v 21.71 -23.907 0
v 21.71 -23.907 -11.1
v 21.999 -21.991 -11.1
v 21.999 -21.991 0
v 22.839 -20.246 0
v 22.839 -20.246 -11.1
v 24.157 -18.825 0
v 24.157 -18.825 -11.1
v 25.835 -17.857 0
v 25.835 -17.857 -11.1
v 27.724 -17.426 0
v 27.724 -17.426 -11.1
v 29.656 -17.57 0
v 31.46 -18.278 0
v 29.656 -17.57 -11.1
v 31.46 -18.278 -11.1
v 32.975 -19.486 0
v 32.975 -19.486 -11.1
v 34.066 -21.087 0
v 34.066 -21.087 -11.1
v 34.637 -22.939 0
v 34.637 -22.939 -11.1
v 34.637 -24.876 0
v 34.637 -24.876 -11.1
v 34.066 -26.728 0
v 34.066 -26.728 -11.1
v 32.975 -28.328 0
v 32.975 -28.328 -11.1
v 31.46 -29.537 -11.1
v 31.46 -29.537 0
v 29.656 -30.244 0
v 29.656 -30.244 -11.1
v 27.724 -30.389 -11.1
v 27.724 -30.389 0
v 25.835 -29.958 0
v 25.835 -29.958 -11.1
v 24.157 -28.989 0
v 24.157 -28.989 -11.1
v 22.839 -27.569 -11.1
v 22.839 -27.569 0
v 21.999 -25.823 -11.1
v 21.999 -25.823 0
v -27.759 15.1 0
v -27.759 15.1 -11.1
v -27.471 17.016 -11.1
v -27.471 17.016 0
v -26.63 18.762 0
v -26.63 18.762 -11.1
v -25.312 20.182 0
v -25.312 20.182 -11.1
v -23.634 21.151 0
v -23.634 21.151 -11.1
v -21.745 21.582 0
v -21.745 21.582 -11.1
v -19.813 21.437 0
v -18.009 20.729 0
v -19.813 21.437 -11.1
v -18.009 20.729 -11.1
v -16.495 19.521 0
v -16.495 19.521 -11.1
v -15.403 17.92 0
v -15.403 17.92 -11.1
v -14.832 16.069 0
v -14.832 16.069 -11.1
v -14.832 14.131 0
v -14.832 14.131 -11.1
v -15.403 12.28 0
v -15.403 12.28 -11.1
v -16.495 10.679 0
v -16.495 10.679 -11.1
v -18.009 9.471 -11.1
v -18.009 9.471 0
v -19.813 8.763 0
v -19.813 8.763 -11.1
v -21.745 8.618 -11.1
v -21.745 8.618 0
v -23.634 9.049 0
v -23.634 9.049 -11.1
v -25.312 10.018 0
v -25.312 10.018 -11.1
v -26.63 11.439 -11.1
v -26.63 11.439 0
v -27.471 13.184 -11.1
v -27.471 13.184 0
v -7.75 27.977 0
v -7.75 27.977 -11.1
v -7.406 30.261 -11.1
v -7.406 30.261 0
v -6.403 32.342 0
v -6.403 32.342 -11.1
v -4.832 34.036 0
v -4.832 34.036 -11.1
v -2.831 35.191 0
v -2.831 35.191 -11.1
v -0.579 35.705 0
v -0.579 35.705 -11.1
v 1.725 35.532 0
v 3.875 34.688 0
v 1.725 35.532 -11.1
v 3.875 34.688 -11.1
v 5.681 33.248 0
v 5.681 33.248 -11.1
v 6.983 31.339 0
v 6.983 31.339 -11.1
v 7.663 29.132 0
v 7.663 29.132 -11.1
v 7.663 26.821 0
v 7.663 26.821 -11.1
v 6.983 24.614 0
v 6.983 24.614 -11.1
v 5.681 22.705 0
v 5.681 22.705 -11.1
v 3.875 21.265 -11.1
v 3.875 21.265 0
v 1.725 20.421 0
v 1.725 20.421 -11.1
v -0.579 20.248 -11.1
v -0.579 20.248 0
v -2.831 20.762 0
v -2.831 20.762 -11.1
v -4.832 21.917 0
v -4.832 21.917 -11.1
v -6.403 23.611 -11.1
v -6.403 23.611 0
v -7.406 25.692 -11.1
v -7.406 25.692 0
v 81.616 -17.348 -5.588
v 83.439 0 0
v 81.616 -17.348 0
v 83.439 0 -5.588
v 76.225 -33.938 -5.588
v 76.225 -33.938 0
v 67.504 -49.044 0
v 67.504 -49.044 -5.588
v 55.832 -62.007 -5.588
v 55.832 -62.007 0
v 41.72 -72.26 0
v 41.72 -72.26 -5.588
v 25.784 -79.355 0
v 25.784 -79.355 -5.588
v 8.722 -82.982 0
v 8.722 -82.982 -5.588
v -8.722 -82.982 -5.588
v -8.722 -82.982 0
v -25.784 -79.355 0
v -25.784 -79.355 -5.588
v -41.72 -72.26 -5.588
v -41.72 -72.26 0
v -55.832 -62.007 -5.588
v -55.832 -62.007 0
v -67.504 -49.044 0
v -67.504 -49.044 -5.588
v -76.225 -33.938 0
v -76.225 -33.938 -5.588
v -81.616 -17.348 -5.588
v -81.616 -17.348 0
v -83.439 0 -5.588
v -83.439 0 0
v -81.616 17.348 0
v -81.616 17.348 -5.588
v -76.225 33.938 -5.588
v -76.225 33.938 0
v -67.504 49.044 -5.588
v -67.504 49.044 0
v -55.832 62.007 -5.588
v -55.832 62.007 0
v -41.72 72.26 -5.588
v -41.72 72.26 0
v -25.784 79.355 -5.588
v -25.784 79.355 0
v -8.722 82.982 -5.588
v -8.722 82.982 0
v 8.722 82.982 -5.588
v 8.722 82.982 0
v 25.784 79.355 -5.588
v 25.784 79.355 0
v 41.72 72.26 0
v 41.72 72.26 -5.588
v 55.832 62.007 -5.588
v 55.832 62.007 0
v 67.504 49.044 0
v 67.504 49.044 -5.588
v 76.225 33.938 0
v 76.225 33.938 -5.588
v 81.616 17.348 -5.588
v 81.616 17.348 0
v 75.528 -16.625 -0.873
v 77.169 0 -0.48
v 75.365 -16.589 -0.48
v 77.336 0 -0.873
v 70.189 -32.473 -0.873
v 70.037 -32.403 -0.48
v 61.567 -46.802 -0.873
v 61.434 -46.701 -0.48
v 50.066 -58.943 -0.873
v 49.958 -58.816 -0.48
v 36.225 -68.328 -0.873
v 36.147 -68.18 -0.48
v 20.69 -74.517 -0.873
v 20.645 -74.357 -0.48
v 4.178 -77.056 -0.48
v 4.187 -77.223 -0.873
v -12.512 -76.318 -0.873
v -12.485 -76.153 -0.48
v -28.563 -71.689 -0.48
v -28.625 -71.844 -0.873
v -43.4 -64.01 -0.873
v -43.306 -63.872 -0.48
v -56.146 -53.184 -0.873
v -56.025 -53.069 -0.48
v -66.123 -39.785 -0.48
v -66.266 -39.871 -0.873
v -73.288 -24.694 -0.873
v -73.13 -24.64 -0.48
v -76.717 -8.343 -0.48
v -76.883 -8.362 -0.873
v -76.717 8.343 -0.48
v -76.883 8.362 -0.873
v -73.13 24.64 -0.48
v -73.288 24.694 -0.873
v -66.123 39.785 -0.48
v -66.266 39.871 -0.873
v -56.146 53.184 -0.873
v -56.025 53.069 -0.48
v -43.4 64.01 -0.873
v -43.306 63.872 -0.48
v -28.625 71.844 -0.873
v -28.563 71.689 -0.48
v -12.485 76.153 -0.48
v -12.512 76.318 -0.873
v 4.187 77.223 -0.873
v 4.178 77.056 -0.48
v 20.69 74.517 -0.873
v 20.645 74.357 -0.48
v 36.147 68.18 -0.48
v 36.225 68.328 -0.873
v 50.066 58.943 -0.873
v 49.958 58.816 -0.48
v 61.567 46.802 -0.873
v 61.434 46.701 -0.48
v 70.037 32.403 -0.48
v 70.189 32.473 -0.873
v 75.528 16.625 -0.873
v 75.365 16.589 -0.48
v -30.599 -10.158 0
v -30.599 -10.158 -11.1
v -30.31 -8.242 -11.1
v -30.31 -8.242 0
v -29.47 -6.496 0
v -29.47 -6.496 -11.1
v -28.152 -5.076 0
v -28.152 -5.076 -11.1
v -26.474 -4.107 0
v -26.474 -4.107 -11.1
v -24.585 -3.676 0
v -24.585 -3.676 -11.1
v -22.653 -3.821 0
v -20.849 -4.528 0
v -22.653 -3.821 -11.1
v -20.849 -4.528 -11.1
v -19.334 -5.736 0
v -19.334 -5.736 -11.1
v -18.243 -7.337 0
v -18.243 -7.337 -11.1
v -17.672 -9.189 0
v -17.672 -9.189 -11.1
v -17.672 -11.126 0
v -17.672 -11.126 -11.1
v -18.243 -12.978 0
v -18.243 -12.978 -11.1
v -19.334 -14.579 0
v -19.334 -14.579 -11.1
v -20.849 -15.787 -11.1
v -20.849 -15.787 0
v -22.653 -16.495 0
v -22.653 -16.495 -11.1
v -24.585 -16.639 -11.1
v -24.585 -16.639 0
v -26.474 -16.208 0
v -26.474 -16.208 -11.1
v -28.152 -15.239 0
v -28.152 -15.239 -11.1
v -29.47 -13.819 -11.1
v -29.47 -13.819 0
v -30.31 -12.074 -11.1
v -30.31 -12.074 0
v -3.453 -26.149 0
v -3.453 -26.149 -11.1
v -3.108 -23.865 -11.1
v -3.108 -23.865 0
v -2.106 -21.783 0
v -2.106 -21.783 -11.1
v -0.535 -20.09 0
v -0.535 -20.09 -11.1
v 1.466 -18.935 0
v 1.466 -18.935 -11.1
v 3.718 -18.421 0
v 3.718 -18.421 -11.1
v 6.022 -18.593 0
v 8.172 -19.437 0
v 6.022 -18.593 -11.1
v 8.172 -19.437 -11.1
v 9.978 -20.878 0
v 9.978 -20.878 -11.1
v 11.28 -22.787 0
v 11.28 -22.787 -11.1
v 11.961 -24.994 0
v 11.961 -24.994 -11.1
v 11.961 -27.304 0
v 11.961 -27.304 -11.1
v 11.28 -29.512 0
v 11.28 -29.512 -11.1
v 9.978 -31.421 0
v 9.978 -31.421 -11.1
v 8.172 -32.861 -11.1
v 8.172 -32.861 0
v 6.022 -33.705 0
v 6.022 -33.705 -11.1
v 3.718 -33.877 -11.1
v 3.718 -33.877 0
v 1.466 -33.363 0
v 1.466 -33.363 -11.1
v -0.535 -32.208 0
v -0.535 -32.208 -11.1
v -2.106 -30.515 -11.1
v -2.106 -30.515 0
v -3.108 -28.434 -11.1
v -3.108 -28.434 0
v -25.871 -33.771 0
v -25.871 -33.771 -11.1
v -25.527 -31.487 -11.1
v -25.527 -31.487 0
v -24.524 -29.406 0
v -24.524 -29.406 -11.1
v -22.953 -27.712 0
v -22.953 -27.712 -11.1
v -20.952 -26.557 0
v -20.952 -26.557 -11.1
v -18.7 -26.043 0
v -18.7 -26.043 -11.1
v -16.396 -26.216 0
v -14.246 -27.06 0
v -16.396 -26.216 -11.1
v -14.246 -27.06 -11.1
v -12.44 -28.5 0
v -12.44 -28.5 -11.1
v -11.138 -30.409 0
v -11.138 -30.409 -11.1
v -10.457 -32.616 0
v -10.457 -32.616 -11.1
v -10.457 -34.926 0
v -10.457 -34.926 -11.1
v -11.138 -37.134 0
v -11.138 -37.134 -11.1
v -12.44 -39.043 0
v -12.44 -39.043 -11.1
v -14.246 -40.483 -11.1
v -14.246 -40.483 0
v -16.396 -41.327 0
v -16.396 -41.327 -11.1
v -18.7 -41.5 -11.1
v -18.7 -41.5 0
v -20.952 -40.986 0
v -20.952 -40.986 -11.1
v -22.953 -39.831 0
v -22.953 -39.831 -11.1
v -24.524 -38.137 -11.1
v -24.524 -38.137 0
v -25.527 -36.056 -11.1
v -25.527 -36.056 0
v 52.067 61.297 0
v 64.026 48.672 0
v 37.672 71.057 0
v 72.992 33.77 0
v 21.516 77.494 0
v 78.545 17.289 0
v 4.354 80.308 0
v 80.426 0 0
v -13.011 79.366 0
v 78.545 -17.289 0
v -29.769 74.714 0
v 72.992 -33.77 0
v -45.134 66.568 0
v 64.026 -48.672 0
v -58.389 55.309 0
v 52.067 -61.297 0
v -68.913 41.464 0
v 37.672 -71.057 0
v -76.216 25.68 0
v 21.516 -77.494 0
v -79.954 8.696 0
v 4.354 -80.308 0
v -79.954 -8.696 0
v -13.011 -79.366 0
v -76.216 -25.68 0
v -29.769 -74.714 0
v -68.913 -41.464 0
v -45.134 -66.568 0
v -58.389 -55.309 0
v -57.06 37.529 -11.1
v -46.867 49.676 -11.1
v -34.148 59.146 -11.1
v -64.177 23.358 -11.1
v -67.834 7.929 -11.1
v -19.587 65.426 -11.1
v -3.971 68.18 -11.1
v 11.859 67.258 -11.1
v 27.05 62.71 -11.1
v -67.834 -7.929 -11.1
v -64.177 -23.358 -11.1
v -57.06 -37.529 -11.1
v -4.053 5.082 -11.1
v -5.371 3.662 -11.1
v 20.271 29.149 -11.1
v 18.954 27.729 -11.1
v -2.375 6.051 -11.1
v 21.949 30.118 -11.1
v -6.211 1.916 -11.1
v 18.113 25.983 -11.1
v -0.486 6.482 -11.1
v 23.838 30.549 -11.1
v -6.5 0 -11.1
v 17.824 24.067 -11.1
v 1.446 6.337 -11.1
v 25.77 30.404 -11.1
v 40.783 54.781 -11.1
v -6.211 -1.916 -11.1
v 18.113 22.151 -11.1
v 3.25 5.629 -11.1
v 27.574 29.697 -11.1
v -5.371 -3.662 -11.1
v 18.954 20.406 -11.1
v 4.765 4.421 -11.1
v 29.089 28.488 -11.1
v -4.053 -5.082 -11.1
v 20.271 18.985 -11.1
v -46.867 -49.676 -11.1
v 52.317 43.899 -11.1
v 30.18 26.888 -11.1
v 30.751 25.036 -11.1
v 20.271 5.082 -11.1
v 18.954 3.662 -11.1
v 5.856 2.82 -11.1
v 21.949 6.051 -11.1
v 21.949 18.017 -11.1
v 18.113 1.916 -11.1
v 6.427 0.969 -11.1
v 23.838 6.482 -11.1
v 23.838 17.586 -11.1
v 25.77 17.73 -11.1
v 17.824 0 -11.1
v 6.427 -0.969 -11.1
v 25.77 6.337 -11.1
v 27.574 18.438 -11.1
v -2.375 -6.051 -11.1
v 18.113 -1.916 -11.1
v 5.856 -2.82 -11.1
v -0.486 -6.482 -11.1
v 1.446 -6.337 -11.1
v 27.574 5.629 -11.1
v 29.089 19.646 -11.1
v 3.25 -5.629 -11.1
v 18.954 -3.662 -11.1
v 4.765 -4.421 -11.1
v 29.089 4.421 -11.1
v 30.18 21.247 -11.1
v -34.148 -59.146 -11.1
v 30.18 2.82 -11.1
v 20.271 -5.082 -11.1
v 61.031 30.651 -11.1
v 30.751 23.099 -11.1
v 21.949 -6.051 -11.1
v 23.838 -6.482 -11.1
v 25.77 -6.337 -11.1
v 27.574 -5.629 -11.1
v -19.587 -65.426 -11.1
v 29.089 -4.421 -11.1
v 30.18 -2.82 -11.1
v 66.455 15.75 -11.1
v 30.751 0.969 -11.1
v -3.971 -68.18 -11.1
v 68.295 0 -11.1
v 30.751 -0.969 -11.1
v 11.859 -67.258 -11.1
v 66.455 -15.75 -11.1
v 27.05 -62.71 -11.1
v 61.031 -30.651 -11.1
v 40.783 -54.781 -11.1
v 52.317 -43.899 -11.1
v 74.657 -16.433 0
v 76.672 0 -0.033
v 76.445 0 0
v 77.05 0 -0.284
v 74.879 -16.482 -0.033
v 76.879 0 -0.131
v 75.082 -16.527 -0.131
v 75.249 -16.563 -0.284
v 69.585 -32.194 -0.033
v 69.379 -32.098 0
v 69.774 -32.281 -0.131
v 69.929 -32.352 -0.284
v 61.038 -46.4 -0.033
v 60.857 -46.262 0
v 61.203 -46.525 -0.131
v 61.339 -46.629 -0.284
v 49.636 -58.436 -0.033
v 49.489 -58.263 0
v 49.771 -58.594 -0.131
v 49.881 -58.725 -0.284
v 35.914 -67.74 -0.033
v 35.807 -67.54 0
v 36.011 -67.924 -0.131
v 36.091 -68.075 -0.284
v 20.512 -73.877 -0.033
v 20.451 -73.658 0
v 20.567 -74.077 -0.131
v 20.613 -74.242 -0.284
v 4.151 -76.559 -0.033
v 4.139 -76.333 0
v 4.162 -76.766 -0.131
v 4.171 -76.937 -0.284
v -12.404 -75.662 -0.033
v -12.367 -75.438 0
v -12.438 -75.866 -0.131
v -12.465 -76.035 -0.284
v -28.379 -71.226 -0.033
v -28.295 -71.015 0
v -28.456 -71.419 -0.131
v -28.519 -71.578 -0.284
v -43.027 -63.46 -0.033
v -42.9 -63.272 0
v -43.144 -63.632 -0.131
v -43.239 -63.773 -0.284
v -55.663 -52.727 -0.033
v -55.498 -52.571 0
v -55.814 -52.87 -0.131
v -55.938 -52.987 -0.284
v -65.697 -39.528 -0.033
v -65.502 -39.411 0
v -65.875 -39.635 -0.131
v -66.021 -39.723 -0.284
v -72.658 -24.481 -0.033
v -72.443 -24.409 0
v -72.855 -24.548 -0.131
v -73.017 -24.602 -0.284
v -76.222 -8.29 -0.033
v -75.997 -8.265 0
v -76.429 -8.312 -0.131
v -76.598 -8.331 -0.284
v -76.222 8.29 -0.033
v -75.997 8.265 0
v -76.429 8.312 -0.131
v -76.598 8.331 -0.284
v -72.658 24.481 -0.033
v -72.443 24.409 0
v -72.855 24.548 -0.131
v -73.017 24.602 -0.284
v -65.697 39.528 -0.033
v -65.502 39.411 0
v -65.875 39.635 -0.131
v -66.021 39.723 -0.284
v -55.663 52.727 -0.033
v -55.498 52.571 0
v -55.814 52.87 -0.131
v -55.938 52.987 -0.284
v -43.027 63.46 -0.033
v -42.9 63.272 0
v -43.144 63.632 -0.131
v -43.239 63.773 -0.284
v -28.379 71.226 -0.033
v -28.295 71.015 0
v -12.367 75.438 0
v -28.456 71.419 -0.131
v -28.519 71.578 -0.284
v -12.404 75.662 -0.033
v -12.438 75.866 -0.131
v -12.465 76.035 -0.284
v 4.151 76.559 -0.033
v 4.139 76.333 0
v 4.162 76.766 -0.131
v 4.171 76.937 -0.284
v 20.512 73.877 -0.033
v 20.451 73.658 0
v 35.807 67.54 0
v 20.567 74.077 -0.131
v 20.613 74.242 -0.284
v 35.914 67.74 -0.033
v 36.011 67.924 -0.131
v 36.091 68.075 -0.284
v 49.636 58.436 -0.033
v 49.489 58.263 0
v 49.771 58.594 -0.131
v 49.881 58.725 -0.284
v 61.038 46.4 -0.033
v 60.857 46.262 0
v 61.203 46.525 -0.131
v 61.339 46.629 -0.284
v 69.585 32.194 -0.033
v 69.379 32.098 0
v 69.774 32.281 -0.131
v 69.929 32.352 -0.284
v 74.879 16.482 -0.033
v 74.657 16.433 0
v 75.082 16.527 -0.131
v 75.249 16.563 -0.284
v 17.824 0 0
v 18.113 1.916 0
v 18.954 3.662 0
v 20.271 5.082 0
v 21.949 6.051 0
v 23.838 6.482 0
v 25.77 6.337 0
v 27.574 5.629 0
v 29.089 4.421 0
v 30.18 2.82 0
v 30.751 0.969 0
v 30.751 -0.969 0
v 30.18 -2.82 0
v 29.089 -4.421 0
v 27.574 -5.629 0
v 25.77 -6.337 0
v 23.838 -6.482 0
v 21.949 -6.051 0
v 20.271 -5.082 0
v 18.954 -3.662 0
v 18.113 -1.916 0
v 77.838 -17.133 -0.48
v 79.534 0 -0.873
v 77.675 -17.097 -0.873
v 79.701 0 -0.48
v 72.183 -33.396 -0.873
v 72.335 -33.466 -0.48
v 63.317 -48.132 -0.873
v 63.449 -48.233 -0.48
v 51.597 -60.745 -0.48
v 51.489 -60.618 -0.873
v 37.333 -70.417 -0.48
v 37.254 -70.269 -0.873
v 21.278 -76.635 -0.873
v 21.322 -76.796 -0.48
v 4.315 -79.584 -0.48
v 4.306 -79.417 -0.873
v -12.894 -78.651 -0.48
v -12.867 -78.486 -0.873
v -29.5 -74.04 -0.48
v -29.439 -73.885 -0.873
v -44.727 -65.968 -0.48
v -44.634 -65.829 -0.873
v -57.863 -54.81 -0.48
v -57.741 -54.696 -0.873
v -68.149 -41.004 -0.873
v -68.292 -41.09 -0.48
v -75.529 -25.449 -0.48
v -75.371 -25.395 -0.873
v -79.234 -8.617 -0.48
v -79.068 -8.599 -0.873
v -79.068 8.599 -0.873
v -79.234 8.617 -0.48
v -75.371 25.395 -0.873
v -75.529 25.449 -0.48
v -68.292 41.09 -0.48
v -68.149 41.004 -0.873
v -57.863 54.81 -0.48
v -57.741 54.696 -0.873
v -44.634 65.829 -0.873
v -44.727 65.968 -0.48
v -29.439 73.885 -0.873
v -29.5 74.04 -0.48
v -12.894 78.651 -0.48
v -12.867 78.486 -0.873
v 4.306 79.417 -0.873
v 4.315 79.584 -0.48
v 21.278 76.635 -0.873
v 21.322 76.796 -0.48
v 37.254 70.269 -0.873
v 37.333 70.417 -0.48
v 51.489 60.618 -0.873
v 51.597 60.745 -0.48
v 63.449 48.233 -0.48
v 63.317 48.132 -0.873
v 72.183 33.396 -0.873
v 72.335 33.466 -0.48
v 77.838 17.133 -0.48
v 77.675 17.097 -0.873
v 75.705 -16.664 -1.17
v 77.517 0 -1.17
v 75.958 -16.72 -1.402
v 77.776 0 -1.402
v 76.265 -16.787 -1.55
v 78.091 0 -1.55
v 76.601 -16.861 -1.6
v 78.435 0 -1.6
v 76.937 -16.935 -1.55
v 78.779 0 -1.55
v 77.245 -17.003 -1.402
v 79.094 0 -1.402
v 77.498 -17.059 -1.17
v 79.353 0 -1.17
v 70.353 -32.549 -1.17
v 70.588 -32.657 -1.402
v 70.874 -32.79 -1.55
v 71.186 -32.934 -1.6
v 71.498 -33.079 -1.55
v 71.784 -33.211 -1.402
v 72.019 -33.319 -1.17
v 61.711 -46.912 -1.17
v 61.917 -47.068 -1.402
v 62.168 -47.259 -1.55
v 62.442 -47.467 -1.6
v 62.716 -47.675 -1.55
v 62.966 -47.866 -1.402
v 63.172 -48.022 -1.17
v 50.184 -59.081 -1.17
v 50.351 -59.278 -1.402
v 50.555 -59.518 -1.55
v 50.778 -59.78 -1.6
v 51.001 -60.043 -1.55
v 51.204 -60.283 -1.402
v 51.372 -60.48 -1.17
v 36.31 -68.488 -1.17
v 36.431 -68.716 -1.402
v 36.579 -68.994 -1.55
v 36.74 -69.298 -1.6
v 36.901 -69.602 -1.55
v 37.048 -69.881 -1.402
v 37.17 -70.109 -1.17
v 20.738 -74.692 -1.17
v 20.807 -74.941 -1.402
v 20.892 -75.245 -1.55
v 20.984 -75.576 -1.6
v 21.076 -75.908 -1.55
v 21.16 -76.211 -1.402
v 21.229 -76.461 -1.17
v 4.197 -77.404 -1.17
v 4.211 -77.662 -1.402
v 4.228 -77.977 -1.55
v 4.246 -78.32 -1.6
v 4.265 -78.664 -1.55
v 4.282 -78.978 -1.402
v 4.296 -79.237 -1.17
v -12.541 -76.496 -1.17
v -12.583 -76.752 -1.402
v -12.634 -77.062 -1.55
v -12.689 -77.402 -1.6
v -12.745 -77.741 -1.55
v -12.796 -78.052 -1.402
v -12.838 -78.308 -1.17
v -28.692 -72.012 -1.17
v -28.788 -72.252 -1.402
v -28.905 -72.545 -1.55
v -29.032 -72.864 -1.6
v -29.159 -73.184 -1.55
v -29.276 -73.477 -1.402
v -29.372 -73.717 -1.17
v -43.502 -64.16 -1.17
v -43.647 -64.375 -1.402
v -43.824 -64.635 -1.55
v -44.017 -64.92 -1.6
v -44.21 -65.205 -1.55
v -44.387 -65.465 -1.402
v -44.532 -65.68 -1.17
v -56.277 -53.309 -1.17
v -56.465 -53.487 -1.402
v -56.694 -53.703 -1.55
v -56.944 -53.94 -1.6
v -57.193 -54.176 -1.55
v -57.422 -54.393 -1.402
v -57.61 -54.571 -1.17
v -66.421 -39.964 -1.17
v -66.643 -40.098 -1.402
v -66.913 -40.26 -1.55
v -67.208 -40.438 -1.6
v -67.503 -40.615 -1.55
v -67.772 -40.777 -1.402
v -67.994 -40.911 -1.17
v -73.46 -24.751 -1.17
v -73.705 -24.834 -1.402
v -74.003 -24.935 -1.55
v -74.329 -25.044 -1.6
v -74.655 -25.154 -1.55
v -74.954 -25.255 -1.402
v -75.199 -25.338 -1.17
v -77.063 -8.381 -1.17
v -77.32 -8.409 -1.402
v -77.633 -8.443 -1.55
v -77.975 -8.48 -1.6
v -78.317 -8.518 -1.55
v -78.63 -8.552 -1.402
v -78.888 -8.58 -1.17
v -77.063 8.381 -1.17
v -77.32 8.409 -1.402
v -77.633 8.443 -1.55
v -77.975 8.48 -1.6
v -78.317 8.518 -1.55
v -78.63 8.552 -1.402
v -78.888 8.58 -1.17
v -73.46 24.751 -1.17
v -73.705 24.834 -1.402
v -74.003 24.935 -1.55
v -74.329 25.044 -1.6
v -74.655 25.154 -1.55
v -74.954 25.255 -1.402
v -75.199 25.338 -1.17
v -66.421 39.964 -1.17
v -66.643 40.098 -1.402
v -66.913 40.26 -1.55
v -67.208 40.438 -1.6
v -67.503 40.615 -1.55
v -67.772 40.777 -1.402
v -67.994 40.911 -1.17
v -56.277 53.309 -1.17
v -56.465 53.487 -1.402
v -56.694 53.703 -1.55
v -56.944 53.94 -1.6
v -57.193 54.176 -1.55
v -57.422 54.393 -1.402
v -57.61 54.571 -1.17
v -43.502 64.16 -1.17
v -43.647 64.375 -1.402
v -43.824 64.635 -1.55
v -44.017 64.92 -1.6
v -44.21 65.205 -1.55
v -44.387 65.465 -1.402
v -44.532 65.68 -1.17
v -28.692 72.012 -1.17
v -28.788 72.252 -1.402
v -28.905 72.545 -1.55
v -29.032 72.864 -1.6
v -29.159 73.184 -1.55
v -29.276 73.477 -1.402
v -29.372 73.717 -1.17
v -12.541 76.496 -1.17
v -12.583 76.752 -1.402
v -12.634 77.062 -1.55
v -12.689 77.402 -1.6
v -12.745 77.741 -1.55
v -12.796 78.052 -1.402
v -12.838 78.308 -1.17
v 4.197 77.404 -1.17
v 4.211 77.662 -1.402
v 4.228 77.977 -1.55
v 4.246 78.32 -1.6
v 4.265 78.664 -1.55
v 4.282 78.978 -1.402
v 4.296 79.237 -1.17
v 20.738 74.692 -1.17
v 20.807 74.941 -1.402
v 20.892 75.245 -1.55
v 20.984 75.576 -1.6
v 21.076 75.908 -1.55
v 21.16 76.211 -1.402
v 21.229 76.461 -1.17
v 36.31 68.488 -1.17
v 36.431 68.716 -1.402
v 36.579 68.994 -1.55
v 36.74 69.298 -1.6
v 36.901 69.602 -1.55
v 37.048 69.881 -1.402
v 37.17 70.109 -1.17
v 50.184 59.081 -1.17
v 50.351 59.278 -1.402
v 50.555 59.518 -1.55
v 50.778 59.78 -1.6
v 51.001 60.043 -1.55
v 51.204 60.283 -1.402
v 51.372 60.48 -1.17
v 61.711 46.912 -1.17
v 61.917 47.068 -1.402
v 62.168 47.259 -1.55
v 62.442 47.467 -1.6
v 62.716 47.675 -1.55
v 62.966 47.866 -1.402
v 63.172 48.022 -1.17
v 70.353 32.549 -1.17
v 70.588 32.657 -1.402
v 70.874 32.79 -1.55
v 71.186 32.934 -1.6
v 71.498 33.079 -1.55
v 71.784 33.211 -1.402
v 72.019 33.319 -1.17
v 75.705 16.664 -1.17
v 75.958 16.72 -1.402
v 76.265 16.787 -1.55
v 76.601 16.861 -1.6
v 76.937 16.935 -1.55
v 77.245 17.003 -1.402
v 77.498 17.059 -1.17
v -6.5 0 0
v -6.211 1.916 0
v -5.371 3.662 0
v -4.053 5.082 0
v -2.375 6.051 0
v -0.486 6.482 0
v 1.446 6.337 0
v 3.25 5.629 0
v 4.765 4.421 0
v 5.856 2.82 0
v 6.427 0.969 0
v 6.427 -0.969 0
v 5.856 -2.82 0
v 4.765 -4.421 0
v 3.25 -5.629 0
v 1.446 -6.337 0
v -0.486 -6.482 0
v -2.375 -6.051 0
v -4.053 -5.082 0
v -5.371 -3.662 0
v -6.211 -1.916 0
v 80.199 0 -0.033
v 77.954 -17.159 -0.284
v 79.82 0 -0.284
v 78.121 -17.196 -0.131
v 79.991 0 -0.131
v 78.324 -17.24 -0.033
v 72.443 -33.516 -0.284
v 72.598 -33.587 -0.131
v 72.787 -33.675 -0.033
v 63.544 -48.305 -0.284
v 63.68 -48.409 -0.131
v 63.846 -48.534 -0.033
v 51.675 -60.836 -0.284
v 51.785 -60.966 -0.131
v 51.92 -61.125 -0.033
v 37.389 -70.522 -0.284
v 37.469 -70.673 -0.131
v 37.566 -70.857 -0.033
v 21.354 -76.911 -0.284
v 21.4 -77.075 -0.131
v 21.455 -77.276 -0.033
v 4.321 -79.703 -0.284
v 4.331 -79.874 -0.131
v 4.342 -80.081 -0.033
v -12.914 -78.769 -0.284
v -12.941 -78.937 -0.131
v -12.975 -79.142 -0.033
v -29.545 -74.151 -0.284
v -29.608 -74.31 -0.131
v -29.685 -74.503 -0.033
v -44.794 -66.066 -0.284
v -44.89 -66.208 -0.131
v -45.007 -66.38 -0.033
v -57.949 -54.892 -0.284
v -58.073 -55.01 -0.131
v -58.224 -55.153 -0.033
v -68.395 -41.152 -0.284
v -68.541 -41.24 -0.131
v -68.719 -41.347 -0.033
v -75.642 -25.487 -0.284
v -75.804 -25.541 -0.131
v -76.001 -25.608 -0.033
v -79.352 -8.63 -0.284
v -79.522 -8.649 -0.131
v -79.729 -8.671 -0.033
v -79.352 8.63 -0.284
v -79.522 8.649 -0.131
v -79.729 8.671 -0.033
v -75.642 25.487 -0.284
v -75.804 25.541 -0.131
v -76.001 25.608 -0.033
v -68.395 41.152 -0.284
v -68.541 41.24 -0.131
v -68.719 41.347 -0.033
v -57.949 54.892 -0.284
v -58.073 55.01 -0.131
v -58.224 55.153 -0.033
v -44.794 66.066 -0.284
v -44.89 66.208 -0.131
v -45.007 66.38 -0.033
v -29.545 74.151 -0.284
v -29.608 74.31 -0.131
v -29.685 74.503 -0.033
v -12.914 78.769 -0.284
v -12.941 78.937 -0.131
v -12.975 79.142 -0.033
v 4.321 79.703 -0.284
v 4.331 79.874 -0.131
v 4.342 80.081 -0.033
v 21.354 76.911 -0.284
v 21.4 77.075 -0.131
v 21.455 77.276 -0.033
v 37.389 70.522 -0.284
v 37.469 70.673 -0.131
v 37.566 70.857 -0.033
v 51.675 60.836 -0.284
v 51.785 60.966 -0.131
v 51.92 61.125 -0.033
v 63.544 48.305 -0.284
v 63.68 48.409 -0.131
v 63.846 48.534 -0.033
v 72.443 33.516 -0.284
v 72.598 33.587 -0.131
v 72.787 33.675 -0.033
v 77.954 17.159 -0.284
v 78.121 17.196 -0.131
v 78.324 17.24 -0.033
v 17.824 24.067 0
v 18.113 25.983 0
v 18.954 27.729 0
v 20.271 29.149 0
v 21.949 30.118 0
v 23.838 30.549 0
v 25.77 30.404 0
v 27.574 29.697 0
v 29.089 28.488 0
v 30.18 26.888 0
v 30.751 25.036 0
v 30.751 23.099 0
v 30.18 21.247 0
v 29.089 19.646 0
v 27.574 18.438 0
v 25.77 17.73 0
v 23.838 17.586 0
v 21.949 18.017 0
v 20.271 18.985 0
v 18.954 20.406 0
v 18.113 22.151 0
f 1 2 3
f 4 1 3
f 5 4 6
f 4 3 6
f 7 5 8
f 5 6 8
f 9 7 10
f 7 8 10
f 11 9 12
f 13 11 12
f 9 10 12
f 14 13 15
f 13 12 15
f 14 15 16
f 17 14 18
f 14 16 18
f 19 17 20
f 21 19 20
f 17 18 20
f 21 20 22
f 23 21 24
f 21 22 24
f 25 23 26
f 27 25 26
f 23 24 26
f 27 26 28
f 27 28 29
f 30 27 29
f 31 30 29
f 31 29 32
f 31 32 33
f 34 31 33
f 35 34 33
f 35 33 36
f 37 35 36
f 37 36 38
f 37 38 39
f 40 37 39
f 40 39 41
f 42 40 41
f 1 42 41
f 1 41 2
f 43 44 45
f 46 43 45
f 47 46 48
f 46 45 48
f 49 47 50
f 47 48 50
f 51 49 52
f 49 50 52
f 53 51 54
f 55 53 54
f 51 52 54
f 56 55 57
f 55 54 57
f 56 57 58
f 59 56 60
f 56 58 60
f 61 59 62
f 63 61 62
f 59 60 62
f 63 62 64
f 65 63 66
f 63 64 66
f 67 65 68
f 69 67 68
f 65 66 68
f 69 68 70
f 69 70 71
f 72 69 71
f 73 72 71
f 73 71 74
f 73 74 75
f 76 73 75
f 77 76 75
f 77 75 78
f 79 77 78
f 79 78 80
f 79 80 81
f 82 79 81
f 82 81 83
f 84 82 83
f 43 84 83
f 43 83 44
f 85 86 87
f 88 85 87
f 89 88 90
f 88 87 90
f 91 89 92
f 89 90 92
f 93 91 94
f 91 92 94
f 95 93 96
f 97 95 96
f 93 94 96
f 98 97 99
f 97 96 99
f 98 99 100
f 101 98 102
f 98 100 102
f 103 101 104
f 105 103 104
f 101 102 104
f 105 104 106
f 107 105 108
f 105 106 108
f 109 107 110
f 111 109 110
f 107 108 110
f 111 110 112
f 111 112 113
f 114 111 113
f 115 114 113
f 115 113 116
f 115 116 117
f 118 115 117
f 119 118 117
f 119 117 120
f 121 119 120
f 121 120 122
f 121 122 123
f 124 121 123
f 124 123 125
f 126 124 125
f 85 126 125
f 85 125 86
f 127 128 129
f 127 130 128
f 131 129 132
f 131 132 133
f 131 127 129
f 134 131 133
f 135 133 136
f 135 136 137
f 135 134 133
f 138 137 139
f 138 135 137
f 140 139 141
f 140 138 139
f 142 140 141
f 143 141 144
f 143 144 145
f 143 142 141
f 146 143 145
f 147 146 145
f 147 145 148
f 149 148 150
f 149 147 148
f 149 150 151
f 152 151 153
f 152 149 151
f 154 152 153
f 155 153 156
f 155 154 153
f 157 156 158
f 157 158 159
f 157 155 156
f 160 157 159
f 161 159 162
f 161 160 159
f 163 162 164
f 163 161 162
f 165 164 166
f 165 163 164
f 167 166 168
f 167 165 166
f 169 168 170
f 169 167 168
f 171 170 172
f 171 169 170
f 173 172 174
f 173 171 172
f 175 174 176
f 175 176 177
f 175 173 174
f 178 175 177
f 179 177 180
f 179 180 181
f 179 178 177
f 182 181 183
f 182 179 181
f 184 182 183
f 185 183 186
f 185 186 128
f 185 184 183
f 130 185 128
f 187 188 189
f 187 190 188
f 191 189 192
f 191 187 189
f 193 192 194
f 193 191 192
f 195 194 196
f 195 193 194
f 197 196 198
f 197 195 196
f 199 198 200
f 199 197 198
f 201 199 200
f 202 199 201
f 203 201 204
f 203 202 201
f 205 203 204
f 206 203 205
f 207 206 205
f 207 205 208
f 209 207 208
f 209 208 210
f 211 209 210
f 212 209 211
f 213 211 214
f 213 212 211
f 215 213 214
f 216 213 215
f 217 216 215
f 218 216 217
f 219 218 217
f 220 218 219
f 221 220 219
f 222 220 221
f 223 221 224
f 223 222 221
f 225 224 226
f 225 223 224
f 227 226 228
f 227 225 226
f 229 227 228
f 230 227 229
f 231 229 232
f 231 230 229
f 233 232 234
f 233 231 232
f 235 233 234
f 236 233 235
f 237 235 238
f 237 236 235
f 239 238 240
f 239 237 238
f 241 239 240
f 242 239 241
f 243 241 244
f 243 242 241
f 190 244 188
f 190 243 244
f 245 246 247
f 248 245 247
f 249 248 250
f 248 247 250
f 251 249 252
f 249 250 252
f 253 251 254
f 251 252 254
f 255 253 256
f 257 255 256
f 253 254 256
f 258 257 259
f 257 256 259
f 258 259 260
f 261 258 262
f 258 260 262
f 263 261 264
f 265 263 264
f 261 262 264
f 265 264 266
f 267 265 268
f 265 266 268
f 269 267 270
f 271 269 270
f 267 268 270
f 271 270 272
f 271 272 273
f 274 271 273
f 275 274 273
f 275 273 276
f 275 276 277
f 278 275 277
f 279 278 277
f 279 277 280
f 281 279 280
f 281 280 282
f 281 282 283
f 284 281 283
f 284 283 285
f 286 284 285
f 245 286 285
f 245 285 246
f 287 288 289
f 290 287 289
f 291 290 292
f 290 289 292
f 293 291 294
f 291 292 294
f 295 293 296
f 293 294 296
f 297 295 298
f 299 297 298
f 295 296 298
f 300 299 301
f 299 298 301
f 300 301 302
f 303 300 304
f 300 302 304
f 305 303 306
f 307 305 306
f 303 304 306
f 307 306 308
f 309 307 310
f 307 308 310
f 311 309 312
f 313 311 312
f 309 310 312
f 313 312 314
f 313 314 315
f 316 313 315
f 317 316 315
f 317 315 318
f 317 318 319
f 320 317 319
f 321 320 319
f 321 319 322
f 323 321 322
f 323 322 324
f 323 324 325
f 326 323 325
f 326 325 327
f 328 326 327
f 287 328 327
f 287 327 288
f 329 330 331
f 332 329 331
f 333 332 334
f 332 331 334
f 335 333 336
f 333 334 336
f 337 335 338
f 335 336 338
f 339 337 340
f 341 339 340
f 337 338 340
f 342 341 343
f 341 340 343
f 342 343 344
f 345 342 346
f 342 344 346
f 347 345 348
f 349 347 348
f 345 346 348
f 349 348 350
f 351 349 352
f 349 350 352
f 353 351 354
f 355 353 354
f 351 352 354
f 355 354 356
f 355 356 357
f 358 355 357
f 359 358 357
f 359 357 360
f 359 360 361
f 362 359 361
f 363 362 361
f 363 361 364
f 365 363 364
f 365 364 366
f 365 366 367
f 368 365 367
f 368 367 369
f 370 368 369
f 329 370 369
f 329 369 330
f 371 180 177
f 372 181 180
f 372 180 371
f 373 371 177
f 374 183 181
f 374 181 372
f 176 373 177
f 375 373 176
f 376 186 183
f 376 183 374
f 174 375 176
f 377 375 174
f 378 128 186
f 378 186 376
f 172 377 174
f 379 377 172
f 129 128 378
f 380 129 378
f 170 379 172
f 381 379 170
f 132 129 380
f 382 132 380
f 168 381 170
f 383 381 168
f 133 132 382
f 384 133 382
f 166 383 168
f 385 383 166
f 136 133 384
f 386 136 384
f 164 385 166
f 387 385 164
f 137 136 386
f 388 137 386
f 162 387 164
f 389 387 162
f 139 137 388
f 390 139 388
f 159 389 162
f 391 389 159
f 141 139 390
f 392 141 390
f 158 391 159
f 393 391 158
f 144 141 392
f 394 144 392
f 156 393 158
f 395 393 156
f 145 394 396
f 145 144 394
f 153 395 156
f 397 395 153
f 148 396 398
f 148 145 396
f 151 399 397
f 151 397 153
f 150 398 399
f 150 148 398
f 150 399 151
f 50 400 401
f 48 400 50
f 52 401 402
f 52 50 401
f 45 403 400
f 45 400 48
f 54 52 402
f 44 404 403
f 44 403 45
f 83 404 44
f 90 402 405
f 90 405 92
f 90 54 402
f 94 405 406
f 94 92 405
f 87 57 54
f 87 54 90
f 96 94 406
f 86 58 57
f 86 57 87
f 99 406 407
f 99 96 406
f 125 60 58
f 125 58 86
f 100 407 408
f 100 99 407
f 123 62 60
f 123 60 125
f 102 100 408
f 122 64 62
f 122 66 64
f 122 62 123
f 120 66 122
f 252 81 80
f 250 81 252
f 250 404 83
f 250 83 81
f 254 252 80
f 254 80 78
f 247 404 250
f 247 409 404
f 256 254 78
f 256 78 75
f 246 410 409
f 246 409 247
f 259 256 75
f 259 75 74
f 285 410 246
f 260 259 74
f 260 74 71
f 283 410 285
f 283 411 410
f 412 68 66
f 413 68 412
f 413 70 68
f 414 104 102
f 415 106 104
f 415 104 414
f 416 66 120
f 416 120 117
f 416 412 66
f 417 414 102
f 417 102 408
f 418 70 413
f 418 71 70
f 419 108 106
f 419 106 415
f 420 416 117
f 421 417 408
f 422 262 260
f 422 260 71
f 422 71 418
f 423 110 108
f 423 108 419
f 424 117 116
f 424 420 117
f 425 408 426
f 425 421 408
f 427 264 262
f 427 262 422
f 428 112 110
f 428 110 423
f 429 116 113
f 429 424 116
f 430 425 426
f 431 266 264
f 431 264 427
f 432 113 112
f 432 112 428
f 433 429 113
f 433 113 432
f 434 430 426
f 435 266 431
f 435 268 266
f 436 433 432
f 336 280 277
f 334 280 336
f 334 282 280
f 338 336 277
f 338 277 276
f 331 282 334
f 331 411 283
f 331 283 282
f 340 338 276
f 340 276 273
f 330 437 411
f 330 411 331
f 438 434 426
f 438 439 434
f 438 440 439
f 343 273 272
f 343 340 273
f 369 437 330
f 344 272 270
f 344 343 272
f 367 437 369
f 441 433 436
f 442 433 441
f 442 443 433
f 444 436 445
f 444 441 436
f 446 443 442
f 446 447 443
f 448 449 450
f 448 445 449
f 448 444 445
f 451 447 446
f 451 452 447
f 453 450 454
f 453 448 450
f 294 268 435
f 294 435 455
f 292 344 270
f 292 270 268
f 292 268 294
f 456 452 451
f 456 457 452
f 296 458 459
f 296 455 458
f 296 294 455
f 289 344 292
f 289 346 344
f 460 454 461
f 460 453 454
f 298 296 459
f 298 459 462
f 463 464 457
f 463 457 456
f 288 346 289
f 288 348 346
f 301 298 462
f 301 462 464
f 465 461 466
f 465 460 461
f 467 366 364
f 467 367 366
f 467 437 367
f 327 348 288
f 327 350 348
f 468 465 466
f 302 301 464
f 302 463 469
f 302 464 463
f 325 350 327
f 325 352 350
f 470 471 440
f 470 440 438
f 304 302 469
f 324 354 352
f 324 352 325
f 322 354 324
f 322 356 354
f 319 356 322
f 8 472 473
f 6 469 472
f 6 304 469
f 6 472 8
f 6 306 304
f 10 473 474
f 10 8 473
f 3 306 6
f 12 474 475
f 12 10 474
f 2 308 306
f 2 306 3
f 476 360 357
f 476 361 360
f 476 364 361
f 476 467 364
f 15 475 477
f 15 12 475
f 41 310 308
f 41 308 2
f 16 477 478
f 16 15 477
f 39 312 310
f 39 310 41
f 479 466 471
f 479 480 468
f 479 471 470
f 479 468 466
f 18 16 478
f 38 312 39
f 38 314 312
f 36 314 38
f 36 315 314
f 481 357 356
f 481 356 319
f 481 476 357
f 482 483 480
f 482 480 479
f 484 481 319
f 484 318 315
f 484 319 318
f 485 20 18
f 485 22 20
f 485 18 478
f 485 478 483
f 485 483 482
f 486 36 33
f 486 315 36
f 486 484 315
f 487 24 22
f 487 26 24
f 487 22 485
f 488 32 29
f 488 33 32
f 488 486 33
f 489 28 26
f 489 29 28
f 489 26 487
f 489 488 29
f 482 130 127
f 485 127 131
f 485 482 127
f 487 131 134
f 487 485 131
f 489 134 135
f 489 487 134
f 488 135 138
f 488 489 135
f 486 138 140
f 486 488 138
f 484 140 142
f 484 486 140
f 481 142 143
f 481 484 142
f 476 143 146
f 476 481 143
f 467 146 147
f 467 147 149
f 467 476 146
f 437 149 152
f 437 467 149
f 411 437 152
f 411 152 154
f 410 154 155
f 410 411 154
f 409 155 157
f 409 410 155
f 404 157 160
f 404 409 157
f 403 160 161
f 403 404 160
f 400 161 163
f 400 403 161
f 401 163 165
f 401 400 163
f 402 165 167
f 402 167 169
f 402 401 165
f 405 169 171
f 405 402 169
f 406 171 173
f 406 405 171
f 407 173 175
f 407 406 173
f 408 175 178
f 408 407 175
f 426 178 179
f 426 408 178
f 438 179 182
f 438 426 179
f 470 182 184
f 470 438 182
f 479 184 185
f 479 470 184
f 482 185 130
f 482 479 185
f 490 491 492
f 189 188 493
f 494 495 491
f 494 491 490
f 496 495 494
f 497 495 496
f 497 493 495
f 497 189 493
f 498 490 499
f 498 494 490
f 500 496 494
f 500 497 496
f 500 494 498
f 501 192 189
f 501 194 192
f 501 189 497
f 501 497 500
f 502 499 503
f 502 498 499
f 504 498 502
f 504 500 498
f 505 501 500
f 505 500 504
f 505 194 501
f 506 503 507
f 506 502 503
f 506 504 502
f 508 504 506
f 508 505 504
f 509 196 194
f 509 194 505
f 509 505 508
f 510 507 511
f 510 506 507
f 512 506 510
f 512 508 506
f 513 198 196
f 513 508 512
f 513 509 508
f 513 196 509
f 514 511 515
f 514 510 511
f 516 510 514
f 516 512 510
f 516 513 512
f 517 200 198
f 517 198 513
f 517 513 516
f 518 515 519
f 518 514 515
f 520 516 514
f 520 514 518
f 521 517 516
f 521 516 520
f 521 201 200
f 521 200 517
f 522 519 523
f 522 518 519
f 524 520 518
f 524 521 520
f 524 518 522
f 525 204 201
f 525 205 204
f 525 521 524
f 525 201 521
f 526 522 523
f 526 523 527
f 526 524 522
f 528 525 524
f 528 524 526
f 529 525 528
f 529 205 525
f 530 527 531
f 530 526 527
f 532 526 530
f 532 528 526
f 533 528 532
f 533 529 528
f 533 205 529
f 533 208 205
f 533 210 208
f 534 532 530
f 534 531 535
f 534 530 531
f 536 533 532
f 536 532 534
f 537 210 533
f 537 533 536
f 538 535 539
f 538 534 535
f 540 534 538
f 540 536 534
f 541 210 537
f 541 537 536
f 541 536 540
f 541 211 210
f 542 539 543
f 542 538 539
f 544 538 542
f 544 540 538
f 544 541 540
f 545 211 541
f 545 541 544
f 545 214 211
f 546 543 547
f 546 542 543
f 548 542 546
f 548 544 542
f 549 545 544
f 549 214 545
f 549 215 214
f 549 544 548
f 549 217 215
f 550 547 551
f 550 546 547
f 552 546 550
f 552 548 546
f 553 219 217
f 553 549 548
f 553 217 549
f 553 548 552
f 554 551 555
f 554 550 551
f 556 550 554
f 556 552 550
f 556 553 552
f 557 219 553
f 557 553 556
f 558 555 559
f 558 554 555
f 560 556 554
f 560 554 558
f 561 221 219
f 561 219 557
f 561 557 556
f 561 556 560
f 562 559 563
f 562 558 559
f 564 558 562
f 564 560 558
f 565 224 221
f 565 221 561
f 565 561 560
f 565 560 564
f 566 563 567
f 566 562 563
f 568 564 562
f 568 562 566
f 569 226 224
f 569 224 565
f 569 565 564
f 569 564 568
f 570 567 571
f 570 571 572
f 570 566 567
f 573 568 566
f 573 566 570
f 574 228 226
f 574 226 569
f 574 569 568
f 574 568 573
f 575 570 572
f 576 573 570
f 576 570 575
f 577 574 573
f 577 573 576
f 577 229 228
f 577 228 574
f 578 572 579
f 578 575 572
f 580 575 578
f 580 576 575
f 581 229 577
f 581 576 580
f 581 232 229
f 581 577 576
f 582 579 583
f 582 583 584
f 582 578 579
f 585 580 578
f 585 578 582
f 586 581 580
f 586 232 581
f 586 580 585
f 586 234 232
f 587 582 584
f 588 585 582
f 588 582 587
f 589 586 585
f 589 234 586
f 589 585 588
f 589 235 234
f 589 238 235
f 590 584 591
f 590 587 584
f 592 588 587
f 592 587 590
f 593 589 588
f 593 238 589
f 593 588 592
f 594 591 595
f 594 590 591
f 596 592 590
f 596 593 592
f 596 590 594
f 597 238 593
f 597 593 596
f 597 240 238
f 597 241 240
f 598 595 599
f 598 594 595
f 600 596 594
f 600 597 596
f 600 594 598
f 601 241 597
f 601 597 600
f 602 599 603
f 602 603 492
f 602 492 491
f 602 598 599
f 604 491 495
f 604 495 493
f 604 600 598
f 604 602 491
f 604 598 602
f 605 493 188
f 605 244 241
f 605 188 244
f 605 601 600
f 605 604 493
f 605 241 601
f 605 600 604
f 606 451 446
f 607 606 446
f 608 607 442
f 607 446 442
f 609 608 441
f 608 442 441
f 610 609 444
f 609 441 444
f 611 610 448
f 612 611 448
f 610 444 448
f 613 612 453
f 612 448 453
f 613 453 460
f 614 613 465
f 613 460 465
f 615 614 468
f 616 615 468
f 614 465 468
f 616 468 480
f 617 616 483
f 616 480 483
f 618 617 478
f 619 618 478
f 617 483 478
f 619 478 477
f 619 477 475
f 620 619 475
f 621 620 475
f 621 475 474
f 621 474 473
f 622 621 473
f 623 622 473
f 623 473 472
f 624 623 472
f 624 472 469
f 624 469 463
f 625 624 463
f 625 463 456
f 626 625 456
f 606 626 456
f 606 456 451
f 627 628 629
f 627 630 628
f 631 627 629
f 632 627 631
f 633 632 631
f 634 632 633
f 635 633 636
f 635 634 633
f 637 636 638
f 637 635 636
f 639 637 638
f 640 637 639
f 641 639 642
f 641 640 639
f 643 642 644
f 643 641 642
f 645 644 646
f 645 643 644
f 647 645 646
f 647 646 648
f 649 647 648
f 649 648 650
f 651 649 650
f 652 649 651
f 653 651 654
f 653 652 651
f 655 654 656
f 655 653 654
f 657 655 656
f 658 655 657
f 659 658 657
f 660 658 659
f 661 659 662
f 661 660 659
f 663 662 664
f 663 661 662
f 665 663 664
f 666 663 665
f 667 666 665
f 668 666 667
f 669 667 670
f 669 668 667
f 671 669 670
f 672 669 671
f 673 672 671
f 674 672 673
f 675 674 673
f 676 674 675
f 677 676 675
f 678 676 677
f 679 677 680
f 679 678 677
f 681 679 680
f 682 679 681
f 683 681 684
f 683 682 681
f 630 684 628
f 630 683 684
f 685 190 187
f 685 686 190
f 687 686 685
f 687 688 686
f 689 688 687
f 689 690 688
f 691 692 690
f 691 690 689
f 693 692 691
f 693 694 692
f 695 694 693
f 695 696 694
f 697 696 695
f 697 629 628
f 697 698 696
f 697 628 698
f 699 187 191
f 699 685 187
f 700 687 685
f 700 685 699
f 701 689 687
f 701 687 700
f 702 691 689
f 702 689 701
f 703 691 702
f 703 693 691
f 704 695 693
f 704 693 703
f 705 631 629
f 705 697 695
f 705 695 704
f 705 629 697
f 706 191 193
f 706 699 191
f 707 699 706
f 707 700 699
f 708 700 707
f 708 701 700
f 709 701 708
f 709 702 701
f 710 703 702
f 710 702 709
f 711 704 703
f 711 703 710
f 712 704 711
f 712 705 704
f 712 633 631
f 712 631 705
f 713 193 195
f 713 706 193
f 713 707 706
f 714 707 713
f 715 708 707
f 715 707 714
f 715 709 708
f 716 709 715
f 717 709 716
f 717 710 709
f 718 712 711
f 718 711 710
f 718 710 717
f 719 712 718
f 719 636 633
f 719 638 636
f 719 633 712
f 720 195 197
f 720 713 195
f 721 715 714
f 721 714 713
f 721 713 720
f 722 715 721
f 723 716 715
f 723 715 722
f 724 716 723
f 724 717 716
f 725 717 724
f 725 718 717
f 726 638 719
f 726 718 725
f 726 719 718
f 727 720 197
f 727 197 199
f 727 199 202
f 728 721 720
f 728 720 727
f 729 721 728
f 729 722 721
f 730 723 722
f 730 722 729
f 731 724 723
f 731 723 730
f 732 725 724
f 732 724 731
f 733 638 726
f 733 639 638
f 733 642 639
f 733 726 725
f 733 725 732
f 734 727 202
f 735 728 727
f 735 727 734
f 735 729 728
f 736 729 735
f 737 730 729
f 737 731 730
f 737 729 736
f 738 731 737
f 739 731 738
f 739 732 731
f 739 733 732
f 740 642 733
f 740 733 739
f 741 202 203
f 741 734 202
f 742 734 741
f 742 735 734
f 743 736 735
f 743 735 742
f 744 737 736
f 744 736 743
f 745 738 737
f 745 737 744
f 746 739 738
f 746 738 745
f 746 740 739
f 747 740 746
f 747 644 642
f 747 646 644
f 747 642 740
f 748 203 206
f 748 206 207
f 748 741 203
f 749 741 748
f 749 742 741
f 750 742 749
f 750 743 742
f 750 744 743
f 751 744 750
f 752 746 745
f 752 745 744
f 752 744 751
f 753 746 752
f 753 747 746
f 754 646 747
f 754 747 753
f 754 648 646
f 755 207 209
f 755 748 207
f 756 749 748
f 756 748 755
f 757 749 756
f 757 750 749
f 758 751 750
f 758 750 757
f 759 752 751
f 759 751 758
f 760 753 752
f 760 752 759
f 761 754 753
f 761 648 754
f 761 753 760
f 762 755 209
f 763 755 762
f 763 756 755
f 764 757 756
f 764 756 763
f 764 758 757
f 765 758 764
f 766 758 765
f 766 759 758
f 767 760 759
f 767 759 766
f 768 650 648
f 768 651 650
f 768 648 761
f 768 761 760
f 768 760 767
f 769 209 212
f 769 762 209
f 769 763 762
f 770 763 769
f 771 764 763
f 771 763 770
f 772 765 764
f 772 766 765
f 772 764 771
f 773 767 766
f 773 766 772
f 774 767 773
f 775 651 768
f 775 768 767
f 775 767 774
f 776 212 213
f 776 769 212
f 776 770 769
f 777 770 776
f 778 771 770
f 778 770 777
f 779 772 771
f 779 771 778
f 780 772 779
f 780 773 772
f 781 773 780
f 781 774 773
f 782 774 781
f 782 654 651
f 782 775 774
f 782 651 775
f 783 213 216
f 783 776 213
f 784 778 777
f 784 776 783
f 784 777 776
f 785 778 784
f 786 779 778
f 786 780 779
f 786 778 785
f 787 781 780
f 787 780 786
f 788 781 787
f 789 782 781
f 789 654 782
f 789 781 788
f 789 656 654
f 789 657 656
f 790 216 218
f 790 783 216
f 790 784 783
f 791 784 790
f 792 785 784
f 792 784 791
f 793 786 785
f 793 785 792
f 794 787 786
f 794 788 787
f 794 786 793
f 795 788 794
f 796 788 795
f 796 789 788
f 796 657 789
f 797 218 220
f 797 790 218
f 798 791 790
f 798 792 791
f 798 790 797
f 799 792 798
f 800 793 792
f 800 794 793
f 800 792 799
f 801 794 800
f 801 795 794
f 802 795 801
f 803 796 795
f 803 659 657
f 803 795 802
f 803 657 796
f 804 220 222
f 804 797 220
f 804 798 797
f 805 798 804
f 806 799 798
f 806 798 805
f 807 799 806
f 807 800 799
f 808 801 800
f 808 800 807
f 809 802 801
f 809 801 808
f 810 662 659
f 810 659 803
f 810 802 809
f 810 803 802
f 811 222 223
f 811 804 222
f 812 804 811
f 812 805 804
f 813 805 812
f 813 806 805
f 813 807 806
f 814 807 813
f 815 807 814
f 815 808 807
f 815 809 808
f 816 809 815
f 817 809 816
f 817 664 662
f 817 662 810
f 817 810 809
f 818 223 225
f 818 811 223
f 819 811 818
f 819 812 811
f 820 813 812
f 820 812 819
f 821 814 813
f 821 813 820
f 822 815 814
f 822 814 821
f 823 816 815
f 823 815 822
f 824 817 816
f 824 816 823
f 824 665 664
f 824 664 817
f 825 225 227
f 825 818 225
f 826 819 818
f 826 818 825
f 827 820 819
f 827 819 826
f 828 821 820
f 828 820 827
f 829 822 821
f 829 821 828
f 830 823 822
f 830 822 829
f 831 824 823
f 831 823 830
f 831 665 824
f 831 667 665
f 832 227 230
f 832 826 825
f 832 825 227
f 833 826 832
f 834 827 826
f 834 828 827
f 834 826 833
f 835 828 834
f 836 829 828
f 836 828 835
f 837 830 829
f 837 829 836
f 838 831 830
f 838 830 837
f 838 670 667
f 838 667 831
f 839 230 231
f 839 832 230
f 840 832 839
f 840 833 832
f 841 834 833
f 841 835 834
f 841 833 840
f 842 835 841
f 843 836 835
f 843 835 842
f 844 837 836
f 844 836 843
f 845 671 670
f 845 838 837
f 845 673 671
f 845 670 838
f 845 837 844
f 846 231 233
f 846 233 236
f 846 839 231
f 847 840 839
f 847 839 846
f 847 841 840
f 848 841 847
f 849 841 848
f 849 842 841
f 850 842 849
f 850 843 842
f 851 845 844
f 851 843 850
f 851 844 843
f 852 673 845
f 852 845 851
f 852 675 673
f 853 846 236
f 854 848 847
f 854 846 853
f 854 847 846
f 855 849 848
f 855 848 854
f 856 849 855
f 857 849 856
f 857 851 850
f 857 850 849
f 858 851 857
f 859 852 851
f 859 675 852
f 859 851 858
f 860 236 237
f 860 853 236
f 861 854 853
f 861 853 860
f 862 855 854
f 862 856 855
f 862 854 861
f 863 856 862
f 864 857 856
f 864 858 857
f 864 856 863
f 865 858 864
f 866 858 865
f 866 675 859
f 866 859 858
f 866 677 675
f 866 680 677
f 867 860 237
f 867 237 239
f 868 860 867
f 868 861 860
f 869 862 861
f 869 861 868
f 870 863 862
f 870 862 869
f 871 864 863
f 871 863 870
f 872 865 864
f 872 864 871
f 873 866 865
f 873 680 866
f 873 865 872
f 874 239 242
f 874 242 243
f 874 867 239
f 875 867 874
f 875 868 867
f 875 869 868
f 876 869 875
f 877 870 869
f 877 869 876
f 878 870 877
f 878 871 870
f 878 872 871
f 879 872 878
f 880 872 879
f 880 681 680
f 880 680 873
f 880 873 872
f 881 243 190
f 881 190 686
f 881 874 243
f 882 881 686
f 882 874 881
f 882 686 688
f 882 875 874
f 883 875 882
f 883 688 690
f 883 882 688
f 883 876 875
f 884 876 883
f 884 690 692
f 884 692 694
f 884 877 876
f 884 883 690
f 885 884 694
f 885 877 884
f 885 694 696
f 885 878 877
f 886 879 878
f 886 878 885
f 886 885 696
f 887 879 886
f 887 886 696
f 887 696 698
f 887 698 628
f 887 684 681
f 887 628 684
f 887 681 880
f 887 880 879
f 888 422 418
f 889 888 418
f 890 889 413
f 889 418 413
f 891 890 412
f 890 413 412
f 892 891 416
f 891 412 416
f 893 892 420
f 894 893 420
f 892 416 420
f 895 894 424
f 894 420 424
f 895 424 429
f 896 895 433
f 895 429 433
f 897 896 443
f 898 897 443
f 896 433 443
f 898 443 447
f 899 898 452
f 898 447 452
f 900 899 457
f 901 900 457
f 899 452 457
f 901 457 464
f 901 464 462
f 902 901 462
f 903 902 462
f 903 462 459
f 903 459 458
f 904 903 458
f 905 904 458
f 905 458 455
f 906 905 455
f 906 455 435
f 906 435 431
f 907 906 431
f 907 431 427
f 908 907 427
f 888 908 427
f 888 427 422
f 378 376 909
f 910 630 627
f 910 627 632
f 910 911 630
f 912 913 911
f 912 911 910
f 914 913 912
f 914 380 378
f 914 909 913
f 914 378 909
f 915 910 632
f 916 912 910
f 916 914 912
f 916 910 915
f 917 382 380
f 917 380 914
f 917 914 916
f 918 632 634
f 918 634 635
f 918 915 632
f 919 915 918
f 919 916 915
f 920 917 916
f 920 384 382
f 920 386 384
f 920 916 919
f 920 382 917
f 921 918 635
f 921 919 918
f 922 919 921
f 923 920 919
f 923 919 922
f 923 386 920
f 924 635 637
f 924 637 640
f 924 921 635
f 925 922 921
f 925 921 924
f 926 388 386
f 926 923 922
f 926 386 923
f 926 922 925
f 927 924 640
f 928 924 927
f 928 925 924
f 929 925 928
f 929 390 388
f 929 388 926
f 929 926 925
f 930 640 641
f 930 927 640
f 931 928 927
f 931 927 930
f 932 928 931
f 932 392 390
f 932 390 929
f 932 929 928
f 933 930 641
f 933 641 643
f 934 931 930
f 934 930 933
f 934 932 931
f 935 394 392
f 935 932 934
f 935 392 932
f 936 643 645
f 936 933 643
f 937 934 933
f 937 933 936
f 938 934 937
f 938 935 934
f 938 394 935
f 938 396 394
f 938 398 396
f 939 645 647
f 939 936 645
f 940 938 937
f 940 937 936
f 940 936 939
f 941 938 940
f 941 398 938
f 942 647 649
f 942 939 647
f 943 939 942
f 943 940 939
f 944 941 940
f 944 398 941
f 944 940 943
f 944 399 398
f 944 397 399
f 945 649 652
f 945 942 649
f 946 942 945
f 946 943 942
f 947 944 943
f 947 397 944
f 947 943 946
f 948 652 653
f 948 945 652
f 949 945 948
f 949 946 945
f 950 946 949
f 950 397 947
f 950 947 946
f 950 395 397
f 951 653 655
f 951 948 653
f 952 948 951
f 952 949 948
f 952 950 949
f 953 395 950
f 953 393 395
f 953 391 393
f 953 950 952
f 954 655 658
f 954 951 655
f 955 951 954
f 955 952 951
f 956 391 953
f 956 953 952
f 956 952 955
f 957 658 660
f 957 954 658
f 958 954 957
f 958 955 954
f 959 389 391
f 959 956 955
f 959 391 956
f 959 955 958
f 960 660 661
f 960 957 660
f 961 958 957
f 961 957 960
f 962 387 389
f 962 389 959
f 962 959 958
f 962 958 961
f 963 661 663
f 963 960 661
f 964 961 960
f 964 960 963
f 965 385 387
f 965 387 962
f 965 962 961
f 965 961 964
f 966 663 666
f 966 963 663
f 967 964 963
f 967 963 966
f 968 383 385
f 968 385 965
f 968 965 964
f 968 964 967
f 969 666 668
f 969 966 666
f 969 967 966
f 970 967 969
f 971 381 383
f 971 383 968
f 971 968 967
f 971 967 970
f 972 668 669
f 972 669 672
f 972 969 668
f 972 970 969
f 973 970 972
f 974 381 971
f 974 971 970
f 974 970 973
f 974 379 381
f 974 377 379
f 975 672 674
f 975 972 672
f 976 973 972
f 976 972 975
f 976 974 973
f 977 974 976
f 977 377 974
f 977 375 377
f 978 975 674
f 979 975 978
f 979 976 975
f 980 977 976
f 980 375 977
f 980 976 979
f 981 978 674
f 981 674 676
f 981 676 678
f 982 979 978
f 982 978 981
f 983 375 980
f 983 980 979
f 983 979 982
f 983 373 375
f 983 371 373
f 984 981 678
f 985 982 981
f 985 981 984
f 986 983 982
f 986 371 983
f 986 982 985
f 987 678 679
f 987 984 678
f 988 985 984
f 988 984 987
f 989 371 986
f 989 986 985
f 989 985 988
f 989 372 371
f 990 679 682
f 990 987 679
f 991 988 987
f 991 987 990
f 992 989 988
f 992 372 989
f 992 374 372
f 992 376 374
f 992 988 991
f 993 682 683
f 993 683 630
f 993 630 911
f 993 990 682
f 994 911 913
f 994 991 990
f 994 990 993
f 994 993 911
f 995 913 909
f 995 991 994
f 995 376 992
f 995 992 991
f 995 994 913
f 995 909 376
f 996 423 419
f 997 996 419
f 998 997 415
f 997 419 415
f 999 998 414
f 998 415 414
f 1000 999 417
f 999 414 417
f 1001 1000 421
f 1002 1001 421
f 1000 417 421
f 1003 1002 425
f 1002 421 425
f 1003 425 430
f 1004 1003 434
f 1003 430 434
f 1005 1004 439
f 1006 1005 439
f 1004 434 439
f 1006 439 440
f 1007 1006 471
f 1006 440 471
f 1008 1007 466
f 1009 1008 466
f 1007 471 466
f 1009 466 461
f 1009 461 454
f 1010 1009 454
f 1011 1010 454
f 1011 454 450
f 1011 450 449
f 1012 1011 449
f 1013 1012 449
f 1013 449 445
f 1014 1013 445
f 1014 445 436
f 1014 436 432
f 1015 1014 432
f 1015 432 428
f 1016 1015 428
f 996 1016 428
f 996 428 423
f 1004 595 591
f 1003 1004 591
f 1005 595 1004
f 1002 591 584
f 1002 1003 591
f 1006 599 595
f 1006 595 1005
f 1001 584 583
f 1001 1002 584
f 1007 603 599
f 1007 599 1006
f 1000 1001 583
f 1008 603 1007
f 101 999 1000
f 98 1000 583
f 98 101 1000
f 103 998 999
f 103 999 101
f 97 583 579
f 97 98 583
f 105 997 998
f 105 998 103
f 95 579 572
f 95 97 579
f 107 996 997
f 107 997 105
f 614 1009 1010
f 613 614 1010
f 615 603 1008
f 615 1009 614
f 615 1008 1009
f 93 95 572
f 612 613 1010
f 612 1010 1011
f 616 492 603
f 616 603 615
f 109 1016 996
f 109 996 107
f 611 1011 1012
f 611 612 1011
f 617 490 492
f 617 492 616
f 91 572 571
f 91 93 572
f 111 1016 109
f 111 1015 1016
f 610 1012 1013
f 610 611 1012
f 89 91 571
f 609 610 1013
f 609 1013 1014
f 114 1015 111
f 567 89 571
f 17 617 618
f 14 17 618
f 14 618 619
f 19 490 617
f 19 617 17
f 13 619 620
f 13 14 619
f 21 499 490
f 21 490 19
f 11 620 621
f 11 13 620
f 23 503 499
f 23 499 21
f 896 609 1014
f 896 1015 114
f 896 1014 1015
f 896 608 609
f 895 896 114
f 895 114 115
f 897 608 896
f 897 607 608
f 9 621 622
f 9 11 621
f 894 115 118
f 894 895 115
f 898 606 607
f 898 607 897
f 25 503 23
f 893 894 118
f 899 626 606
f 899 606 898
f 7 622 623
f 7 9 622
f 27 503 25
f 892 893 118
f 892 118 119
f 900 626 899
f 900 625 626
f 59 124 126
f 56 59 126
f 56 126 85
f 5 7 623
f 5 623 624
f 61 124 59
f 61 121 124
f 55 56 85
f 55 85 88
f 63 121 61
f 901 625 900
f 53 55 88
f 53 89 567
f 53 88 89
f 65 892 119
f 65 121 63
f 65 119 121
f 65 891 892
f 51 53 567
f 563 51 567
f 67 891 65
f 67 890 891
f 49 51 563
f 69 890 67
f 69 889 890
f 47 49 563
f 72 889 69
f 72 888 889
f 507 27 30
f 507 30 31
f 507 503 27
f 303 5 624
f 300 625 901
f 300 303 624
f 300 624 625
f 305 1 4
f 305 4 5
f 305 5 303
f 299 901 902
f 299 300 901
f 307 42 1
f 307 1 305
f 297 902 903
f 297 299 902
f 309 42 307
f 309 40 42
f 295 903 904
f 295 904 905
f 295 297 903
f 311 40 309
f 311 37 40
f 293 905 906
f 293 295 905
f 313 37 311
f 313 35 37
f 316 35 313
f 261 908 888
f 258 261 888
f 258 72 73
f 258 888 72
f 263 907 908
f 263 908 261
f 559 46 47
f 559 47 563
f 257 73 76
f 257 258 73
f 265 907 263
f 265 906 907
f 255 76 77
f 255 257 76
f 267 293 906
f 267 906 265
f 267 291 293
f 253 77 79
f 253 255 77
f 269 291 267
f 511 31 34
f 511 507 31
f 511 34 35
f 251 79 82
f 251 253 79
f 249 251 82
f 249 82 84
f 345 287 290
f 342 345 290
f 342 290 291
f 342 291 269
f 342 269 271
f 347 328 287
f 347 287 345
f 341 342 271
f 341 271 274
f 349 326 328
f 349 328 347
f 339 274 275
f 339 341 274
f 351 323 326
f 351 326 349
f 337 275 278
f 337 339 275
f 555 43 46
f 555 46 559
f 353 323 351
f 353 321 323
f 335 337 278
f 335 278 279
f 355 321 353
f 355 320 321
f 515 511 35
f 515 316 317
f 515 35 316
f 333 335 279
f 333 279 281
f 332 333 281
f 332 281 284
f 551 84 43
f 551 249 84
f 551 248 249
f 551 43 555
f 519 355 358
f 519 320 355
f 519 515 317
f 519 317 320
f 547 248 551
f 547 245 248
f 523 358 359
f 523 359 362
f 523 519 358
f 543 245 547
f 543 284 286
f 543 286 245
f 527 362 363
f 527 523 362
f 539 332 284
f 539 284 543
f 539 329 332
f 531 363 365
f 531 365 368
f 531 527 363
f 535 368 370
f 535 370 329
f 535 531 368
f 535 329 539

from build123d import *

# Parameters (mm, degrees)
SKETCH2_R          = 6.5
SKETCH2_R_2        = 7.75
CUT_EXTRUDE1_DEPTH = 119.521470637


with BuildPart() as part:
    # Sketch1 → Revolve1 (revolve)
    with BuildSketch(Plane(origin=(0, 0, 0), x_dir=(0, 0, -1), z_dir=(1, 0, 0)), mode=Mode.PRIVATE) as revolve1_sk:
        with BuildLine():
            Line((0, 0), (0, 76.444627725))
            ThreePointArc((0, 76.444627725), (0.130798304, 76.879222907), (0.479738309, 77.169433247))
            Line((0.479738309, 77.169433247), (0.872854821, 77.336301306))
            ThreePointArc((0.872854821, 77.336301306), (1.6002, 78.4352), (0.872854821, 79.534098694))
            Line((0.872854821, 79.534098694), (0.479738309, 79.700966753))
            ThreePointArc((0.479738309, 79.700966753), (0.130798304, 79.991177093), (0, 80.425772275))
            Line((0, 80.425772275), (0, 83.439))
            Line((0, 83.439), (5.588, 83.439))
            Line((5.588, 83.439), (11.0998, 68.295453959))
            Line((11.0998, 68.295453959), (11.0998, 0))
            Line((11.0998, 0), (0, 0))
        make_face()
    revolve(revolve1_sk.sketch.rotate(Axis((0, 0, 0), (0, 0, -1)), 90), axis=Axis((0, 0, 0), (0, 0, -1)))

    # Sketch2 → Cut-Extrude1 (cut, through all)
    with BuildSketch(Plane(origin=(0, 0, -11.0998), x_dir=(-1, 0, 0), z_dir=(0, 0, -1))):
        Circle(SKETCH2_R)
        with Locations((0, 27.9765569)):
            Circle(SKETCH2_R_2)
        with Locations((-24.324092368, 0)):
            Circle(SKETCH2_R)
        with Locations((24.098999837, -10.15759269)):
            Circle(SKETCH2_R)
        with Locations((-24.324092368, 24.067370628)):
            Circle(SKETCH2_R)
        with Locations((21.259374059, 15.100131331)):
            Circle(SKETCH2_R)
        with Locations((-4.297257938, -26.149169437)):
            Circle(SKETCH2_R_2)
        with Locations((-28.209896064, -23.907359612)):
            Circle(SKETCH2_R)
        with Locations((18.120840305, -33.771322839)):
            Circle(SKETCH2_R_2)
    extrude(amount=-CUT_EXTRUDE1_DEPTH, mode=Mode.SUBTRACT)


solid = part.part
